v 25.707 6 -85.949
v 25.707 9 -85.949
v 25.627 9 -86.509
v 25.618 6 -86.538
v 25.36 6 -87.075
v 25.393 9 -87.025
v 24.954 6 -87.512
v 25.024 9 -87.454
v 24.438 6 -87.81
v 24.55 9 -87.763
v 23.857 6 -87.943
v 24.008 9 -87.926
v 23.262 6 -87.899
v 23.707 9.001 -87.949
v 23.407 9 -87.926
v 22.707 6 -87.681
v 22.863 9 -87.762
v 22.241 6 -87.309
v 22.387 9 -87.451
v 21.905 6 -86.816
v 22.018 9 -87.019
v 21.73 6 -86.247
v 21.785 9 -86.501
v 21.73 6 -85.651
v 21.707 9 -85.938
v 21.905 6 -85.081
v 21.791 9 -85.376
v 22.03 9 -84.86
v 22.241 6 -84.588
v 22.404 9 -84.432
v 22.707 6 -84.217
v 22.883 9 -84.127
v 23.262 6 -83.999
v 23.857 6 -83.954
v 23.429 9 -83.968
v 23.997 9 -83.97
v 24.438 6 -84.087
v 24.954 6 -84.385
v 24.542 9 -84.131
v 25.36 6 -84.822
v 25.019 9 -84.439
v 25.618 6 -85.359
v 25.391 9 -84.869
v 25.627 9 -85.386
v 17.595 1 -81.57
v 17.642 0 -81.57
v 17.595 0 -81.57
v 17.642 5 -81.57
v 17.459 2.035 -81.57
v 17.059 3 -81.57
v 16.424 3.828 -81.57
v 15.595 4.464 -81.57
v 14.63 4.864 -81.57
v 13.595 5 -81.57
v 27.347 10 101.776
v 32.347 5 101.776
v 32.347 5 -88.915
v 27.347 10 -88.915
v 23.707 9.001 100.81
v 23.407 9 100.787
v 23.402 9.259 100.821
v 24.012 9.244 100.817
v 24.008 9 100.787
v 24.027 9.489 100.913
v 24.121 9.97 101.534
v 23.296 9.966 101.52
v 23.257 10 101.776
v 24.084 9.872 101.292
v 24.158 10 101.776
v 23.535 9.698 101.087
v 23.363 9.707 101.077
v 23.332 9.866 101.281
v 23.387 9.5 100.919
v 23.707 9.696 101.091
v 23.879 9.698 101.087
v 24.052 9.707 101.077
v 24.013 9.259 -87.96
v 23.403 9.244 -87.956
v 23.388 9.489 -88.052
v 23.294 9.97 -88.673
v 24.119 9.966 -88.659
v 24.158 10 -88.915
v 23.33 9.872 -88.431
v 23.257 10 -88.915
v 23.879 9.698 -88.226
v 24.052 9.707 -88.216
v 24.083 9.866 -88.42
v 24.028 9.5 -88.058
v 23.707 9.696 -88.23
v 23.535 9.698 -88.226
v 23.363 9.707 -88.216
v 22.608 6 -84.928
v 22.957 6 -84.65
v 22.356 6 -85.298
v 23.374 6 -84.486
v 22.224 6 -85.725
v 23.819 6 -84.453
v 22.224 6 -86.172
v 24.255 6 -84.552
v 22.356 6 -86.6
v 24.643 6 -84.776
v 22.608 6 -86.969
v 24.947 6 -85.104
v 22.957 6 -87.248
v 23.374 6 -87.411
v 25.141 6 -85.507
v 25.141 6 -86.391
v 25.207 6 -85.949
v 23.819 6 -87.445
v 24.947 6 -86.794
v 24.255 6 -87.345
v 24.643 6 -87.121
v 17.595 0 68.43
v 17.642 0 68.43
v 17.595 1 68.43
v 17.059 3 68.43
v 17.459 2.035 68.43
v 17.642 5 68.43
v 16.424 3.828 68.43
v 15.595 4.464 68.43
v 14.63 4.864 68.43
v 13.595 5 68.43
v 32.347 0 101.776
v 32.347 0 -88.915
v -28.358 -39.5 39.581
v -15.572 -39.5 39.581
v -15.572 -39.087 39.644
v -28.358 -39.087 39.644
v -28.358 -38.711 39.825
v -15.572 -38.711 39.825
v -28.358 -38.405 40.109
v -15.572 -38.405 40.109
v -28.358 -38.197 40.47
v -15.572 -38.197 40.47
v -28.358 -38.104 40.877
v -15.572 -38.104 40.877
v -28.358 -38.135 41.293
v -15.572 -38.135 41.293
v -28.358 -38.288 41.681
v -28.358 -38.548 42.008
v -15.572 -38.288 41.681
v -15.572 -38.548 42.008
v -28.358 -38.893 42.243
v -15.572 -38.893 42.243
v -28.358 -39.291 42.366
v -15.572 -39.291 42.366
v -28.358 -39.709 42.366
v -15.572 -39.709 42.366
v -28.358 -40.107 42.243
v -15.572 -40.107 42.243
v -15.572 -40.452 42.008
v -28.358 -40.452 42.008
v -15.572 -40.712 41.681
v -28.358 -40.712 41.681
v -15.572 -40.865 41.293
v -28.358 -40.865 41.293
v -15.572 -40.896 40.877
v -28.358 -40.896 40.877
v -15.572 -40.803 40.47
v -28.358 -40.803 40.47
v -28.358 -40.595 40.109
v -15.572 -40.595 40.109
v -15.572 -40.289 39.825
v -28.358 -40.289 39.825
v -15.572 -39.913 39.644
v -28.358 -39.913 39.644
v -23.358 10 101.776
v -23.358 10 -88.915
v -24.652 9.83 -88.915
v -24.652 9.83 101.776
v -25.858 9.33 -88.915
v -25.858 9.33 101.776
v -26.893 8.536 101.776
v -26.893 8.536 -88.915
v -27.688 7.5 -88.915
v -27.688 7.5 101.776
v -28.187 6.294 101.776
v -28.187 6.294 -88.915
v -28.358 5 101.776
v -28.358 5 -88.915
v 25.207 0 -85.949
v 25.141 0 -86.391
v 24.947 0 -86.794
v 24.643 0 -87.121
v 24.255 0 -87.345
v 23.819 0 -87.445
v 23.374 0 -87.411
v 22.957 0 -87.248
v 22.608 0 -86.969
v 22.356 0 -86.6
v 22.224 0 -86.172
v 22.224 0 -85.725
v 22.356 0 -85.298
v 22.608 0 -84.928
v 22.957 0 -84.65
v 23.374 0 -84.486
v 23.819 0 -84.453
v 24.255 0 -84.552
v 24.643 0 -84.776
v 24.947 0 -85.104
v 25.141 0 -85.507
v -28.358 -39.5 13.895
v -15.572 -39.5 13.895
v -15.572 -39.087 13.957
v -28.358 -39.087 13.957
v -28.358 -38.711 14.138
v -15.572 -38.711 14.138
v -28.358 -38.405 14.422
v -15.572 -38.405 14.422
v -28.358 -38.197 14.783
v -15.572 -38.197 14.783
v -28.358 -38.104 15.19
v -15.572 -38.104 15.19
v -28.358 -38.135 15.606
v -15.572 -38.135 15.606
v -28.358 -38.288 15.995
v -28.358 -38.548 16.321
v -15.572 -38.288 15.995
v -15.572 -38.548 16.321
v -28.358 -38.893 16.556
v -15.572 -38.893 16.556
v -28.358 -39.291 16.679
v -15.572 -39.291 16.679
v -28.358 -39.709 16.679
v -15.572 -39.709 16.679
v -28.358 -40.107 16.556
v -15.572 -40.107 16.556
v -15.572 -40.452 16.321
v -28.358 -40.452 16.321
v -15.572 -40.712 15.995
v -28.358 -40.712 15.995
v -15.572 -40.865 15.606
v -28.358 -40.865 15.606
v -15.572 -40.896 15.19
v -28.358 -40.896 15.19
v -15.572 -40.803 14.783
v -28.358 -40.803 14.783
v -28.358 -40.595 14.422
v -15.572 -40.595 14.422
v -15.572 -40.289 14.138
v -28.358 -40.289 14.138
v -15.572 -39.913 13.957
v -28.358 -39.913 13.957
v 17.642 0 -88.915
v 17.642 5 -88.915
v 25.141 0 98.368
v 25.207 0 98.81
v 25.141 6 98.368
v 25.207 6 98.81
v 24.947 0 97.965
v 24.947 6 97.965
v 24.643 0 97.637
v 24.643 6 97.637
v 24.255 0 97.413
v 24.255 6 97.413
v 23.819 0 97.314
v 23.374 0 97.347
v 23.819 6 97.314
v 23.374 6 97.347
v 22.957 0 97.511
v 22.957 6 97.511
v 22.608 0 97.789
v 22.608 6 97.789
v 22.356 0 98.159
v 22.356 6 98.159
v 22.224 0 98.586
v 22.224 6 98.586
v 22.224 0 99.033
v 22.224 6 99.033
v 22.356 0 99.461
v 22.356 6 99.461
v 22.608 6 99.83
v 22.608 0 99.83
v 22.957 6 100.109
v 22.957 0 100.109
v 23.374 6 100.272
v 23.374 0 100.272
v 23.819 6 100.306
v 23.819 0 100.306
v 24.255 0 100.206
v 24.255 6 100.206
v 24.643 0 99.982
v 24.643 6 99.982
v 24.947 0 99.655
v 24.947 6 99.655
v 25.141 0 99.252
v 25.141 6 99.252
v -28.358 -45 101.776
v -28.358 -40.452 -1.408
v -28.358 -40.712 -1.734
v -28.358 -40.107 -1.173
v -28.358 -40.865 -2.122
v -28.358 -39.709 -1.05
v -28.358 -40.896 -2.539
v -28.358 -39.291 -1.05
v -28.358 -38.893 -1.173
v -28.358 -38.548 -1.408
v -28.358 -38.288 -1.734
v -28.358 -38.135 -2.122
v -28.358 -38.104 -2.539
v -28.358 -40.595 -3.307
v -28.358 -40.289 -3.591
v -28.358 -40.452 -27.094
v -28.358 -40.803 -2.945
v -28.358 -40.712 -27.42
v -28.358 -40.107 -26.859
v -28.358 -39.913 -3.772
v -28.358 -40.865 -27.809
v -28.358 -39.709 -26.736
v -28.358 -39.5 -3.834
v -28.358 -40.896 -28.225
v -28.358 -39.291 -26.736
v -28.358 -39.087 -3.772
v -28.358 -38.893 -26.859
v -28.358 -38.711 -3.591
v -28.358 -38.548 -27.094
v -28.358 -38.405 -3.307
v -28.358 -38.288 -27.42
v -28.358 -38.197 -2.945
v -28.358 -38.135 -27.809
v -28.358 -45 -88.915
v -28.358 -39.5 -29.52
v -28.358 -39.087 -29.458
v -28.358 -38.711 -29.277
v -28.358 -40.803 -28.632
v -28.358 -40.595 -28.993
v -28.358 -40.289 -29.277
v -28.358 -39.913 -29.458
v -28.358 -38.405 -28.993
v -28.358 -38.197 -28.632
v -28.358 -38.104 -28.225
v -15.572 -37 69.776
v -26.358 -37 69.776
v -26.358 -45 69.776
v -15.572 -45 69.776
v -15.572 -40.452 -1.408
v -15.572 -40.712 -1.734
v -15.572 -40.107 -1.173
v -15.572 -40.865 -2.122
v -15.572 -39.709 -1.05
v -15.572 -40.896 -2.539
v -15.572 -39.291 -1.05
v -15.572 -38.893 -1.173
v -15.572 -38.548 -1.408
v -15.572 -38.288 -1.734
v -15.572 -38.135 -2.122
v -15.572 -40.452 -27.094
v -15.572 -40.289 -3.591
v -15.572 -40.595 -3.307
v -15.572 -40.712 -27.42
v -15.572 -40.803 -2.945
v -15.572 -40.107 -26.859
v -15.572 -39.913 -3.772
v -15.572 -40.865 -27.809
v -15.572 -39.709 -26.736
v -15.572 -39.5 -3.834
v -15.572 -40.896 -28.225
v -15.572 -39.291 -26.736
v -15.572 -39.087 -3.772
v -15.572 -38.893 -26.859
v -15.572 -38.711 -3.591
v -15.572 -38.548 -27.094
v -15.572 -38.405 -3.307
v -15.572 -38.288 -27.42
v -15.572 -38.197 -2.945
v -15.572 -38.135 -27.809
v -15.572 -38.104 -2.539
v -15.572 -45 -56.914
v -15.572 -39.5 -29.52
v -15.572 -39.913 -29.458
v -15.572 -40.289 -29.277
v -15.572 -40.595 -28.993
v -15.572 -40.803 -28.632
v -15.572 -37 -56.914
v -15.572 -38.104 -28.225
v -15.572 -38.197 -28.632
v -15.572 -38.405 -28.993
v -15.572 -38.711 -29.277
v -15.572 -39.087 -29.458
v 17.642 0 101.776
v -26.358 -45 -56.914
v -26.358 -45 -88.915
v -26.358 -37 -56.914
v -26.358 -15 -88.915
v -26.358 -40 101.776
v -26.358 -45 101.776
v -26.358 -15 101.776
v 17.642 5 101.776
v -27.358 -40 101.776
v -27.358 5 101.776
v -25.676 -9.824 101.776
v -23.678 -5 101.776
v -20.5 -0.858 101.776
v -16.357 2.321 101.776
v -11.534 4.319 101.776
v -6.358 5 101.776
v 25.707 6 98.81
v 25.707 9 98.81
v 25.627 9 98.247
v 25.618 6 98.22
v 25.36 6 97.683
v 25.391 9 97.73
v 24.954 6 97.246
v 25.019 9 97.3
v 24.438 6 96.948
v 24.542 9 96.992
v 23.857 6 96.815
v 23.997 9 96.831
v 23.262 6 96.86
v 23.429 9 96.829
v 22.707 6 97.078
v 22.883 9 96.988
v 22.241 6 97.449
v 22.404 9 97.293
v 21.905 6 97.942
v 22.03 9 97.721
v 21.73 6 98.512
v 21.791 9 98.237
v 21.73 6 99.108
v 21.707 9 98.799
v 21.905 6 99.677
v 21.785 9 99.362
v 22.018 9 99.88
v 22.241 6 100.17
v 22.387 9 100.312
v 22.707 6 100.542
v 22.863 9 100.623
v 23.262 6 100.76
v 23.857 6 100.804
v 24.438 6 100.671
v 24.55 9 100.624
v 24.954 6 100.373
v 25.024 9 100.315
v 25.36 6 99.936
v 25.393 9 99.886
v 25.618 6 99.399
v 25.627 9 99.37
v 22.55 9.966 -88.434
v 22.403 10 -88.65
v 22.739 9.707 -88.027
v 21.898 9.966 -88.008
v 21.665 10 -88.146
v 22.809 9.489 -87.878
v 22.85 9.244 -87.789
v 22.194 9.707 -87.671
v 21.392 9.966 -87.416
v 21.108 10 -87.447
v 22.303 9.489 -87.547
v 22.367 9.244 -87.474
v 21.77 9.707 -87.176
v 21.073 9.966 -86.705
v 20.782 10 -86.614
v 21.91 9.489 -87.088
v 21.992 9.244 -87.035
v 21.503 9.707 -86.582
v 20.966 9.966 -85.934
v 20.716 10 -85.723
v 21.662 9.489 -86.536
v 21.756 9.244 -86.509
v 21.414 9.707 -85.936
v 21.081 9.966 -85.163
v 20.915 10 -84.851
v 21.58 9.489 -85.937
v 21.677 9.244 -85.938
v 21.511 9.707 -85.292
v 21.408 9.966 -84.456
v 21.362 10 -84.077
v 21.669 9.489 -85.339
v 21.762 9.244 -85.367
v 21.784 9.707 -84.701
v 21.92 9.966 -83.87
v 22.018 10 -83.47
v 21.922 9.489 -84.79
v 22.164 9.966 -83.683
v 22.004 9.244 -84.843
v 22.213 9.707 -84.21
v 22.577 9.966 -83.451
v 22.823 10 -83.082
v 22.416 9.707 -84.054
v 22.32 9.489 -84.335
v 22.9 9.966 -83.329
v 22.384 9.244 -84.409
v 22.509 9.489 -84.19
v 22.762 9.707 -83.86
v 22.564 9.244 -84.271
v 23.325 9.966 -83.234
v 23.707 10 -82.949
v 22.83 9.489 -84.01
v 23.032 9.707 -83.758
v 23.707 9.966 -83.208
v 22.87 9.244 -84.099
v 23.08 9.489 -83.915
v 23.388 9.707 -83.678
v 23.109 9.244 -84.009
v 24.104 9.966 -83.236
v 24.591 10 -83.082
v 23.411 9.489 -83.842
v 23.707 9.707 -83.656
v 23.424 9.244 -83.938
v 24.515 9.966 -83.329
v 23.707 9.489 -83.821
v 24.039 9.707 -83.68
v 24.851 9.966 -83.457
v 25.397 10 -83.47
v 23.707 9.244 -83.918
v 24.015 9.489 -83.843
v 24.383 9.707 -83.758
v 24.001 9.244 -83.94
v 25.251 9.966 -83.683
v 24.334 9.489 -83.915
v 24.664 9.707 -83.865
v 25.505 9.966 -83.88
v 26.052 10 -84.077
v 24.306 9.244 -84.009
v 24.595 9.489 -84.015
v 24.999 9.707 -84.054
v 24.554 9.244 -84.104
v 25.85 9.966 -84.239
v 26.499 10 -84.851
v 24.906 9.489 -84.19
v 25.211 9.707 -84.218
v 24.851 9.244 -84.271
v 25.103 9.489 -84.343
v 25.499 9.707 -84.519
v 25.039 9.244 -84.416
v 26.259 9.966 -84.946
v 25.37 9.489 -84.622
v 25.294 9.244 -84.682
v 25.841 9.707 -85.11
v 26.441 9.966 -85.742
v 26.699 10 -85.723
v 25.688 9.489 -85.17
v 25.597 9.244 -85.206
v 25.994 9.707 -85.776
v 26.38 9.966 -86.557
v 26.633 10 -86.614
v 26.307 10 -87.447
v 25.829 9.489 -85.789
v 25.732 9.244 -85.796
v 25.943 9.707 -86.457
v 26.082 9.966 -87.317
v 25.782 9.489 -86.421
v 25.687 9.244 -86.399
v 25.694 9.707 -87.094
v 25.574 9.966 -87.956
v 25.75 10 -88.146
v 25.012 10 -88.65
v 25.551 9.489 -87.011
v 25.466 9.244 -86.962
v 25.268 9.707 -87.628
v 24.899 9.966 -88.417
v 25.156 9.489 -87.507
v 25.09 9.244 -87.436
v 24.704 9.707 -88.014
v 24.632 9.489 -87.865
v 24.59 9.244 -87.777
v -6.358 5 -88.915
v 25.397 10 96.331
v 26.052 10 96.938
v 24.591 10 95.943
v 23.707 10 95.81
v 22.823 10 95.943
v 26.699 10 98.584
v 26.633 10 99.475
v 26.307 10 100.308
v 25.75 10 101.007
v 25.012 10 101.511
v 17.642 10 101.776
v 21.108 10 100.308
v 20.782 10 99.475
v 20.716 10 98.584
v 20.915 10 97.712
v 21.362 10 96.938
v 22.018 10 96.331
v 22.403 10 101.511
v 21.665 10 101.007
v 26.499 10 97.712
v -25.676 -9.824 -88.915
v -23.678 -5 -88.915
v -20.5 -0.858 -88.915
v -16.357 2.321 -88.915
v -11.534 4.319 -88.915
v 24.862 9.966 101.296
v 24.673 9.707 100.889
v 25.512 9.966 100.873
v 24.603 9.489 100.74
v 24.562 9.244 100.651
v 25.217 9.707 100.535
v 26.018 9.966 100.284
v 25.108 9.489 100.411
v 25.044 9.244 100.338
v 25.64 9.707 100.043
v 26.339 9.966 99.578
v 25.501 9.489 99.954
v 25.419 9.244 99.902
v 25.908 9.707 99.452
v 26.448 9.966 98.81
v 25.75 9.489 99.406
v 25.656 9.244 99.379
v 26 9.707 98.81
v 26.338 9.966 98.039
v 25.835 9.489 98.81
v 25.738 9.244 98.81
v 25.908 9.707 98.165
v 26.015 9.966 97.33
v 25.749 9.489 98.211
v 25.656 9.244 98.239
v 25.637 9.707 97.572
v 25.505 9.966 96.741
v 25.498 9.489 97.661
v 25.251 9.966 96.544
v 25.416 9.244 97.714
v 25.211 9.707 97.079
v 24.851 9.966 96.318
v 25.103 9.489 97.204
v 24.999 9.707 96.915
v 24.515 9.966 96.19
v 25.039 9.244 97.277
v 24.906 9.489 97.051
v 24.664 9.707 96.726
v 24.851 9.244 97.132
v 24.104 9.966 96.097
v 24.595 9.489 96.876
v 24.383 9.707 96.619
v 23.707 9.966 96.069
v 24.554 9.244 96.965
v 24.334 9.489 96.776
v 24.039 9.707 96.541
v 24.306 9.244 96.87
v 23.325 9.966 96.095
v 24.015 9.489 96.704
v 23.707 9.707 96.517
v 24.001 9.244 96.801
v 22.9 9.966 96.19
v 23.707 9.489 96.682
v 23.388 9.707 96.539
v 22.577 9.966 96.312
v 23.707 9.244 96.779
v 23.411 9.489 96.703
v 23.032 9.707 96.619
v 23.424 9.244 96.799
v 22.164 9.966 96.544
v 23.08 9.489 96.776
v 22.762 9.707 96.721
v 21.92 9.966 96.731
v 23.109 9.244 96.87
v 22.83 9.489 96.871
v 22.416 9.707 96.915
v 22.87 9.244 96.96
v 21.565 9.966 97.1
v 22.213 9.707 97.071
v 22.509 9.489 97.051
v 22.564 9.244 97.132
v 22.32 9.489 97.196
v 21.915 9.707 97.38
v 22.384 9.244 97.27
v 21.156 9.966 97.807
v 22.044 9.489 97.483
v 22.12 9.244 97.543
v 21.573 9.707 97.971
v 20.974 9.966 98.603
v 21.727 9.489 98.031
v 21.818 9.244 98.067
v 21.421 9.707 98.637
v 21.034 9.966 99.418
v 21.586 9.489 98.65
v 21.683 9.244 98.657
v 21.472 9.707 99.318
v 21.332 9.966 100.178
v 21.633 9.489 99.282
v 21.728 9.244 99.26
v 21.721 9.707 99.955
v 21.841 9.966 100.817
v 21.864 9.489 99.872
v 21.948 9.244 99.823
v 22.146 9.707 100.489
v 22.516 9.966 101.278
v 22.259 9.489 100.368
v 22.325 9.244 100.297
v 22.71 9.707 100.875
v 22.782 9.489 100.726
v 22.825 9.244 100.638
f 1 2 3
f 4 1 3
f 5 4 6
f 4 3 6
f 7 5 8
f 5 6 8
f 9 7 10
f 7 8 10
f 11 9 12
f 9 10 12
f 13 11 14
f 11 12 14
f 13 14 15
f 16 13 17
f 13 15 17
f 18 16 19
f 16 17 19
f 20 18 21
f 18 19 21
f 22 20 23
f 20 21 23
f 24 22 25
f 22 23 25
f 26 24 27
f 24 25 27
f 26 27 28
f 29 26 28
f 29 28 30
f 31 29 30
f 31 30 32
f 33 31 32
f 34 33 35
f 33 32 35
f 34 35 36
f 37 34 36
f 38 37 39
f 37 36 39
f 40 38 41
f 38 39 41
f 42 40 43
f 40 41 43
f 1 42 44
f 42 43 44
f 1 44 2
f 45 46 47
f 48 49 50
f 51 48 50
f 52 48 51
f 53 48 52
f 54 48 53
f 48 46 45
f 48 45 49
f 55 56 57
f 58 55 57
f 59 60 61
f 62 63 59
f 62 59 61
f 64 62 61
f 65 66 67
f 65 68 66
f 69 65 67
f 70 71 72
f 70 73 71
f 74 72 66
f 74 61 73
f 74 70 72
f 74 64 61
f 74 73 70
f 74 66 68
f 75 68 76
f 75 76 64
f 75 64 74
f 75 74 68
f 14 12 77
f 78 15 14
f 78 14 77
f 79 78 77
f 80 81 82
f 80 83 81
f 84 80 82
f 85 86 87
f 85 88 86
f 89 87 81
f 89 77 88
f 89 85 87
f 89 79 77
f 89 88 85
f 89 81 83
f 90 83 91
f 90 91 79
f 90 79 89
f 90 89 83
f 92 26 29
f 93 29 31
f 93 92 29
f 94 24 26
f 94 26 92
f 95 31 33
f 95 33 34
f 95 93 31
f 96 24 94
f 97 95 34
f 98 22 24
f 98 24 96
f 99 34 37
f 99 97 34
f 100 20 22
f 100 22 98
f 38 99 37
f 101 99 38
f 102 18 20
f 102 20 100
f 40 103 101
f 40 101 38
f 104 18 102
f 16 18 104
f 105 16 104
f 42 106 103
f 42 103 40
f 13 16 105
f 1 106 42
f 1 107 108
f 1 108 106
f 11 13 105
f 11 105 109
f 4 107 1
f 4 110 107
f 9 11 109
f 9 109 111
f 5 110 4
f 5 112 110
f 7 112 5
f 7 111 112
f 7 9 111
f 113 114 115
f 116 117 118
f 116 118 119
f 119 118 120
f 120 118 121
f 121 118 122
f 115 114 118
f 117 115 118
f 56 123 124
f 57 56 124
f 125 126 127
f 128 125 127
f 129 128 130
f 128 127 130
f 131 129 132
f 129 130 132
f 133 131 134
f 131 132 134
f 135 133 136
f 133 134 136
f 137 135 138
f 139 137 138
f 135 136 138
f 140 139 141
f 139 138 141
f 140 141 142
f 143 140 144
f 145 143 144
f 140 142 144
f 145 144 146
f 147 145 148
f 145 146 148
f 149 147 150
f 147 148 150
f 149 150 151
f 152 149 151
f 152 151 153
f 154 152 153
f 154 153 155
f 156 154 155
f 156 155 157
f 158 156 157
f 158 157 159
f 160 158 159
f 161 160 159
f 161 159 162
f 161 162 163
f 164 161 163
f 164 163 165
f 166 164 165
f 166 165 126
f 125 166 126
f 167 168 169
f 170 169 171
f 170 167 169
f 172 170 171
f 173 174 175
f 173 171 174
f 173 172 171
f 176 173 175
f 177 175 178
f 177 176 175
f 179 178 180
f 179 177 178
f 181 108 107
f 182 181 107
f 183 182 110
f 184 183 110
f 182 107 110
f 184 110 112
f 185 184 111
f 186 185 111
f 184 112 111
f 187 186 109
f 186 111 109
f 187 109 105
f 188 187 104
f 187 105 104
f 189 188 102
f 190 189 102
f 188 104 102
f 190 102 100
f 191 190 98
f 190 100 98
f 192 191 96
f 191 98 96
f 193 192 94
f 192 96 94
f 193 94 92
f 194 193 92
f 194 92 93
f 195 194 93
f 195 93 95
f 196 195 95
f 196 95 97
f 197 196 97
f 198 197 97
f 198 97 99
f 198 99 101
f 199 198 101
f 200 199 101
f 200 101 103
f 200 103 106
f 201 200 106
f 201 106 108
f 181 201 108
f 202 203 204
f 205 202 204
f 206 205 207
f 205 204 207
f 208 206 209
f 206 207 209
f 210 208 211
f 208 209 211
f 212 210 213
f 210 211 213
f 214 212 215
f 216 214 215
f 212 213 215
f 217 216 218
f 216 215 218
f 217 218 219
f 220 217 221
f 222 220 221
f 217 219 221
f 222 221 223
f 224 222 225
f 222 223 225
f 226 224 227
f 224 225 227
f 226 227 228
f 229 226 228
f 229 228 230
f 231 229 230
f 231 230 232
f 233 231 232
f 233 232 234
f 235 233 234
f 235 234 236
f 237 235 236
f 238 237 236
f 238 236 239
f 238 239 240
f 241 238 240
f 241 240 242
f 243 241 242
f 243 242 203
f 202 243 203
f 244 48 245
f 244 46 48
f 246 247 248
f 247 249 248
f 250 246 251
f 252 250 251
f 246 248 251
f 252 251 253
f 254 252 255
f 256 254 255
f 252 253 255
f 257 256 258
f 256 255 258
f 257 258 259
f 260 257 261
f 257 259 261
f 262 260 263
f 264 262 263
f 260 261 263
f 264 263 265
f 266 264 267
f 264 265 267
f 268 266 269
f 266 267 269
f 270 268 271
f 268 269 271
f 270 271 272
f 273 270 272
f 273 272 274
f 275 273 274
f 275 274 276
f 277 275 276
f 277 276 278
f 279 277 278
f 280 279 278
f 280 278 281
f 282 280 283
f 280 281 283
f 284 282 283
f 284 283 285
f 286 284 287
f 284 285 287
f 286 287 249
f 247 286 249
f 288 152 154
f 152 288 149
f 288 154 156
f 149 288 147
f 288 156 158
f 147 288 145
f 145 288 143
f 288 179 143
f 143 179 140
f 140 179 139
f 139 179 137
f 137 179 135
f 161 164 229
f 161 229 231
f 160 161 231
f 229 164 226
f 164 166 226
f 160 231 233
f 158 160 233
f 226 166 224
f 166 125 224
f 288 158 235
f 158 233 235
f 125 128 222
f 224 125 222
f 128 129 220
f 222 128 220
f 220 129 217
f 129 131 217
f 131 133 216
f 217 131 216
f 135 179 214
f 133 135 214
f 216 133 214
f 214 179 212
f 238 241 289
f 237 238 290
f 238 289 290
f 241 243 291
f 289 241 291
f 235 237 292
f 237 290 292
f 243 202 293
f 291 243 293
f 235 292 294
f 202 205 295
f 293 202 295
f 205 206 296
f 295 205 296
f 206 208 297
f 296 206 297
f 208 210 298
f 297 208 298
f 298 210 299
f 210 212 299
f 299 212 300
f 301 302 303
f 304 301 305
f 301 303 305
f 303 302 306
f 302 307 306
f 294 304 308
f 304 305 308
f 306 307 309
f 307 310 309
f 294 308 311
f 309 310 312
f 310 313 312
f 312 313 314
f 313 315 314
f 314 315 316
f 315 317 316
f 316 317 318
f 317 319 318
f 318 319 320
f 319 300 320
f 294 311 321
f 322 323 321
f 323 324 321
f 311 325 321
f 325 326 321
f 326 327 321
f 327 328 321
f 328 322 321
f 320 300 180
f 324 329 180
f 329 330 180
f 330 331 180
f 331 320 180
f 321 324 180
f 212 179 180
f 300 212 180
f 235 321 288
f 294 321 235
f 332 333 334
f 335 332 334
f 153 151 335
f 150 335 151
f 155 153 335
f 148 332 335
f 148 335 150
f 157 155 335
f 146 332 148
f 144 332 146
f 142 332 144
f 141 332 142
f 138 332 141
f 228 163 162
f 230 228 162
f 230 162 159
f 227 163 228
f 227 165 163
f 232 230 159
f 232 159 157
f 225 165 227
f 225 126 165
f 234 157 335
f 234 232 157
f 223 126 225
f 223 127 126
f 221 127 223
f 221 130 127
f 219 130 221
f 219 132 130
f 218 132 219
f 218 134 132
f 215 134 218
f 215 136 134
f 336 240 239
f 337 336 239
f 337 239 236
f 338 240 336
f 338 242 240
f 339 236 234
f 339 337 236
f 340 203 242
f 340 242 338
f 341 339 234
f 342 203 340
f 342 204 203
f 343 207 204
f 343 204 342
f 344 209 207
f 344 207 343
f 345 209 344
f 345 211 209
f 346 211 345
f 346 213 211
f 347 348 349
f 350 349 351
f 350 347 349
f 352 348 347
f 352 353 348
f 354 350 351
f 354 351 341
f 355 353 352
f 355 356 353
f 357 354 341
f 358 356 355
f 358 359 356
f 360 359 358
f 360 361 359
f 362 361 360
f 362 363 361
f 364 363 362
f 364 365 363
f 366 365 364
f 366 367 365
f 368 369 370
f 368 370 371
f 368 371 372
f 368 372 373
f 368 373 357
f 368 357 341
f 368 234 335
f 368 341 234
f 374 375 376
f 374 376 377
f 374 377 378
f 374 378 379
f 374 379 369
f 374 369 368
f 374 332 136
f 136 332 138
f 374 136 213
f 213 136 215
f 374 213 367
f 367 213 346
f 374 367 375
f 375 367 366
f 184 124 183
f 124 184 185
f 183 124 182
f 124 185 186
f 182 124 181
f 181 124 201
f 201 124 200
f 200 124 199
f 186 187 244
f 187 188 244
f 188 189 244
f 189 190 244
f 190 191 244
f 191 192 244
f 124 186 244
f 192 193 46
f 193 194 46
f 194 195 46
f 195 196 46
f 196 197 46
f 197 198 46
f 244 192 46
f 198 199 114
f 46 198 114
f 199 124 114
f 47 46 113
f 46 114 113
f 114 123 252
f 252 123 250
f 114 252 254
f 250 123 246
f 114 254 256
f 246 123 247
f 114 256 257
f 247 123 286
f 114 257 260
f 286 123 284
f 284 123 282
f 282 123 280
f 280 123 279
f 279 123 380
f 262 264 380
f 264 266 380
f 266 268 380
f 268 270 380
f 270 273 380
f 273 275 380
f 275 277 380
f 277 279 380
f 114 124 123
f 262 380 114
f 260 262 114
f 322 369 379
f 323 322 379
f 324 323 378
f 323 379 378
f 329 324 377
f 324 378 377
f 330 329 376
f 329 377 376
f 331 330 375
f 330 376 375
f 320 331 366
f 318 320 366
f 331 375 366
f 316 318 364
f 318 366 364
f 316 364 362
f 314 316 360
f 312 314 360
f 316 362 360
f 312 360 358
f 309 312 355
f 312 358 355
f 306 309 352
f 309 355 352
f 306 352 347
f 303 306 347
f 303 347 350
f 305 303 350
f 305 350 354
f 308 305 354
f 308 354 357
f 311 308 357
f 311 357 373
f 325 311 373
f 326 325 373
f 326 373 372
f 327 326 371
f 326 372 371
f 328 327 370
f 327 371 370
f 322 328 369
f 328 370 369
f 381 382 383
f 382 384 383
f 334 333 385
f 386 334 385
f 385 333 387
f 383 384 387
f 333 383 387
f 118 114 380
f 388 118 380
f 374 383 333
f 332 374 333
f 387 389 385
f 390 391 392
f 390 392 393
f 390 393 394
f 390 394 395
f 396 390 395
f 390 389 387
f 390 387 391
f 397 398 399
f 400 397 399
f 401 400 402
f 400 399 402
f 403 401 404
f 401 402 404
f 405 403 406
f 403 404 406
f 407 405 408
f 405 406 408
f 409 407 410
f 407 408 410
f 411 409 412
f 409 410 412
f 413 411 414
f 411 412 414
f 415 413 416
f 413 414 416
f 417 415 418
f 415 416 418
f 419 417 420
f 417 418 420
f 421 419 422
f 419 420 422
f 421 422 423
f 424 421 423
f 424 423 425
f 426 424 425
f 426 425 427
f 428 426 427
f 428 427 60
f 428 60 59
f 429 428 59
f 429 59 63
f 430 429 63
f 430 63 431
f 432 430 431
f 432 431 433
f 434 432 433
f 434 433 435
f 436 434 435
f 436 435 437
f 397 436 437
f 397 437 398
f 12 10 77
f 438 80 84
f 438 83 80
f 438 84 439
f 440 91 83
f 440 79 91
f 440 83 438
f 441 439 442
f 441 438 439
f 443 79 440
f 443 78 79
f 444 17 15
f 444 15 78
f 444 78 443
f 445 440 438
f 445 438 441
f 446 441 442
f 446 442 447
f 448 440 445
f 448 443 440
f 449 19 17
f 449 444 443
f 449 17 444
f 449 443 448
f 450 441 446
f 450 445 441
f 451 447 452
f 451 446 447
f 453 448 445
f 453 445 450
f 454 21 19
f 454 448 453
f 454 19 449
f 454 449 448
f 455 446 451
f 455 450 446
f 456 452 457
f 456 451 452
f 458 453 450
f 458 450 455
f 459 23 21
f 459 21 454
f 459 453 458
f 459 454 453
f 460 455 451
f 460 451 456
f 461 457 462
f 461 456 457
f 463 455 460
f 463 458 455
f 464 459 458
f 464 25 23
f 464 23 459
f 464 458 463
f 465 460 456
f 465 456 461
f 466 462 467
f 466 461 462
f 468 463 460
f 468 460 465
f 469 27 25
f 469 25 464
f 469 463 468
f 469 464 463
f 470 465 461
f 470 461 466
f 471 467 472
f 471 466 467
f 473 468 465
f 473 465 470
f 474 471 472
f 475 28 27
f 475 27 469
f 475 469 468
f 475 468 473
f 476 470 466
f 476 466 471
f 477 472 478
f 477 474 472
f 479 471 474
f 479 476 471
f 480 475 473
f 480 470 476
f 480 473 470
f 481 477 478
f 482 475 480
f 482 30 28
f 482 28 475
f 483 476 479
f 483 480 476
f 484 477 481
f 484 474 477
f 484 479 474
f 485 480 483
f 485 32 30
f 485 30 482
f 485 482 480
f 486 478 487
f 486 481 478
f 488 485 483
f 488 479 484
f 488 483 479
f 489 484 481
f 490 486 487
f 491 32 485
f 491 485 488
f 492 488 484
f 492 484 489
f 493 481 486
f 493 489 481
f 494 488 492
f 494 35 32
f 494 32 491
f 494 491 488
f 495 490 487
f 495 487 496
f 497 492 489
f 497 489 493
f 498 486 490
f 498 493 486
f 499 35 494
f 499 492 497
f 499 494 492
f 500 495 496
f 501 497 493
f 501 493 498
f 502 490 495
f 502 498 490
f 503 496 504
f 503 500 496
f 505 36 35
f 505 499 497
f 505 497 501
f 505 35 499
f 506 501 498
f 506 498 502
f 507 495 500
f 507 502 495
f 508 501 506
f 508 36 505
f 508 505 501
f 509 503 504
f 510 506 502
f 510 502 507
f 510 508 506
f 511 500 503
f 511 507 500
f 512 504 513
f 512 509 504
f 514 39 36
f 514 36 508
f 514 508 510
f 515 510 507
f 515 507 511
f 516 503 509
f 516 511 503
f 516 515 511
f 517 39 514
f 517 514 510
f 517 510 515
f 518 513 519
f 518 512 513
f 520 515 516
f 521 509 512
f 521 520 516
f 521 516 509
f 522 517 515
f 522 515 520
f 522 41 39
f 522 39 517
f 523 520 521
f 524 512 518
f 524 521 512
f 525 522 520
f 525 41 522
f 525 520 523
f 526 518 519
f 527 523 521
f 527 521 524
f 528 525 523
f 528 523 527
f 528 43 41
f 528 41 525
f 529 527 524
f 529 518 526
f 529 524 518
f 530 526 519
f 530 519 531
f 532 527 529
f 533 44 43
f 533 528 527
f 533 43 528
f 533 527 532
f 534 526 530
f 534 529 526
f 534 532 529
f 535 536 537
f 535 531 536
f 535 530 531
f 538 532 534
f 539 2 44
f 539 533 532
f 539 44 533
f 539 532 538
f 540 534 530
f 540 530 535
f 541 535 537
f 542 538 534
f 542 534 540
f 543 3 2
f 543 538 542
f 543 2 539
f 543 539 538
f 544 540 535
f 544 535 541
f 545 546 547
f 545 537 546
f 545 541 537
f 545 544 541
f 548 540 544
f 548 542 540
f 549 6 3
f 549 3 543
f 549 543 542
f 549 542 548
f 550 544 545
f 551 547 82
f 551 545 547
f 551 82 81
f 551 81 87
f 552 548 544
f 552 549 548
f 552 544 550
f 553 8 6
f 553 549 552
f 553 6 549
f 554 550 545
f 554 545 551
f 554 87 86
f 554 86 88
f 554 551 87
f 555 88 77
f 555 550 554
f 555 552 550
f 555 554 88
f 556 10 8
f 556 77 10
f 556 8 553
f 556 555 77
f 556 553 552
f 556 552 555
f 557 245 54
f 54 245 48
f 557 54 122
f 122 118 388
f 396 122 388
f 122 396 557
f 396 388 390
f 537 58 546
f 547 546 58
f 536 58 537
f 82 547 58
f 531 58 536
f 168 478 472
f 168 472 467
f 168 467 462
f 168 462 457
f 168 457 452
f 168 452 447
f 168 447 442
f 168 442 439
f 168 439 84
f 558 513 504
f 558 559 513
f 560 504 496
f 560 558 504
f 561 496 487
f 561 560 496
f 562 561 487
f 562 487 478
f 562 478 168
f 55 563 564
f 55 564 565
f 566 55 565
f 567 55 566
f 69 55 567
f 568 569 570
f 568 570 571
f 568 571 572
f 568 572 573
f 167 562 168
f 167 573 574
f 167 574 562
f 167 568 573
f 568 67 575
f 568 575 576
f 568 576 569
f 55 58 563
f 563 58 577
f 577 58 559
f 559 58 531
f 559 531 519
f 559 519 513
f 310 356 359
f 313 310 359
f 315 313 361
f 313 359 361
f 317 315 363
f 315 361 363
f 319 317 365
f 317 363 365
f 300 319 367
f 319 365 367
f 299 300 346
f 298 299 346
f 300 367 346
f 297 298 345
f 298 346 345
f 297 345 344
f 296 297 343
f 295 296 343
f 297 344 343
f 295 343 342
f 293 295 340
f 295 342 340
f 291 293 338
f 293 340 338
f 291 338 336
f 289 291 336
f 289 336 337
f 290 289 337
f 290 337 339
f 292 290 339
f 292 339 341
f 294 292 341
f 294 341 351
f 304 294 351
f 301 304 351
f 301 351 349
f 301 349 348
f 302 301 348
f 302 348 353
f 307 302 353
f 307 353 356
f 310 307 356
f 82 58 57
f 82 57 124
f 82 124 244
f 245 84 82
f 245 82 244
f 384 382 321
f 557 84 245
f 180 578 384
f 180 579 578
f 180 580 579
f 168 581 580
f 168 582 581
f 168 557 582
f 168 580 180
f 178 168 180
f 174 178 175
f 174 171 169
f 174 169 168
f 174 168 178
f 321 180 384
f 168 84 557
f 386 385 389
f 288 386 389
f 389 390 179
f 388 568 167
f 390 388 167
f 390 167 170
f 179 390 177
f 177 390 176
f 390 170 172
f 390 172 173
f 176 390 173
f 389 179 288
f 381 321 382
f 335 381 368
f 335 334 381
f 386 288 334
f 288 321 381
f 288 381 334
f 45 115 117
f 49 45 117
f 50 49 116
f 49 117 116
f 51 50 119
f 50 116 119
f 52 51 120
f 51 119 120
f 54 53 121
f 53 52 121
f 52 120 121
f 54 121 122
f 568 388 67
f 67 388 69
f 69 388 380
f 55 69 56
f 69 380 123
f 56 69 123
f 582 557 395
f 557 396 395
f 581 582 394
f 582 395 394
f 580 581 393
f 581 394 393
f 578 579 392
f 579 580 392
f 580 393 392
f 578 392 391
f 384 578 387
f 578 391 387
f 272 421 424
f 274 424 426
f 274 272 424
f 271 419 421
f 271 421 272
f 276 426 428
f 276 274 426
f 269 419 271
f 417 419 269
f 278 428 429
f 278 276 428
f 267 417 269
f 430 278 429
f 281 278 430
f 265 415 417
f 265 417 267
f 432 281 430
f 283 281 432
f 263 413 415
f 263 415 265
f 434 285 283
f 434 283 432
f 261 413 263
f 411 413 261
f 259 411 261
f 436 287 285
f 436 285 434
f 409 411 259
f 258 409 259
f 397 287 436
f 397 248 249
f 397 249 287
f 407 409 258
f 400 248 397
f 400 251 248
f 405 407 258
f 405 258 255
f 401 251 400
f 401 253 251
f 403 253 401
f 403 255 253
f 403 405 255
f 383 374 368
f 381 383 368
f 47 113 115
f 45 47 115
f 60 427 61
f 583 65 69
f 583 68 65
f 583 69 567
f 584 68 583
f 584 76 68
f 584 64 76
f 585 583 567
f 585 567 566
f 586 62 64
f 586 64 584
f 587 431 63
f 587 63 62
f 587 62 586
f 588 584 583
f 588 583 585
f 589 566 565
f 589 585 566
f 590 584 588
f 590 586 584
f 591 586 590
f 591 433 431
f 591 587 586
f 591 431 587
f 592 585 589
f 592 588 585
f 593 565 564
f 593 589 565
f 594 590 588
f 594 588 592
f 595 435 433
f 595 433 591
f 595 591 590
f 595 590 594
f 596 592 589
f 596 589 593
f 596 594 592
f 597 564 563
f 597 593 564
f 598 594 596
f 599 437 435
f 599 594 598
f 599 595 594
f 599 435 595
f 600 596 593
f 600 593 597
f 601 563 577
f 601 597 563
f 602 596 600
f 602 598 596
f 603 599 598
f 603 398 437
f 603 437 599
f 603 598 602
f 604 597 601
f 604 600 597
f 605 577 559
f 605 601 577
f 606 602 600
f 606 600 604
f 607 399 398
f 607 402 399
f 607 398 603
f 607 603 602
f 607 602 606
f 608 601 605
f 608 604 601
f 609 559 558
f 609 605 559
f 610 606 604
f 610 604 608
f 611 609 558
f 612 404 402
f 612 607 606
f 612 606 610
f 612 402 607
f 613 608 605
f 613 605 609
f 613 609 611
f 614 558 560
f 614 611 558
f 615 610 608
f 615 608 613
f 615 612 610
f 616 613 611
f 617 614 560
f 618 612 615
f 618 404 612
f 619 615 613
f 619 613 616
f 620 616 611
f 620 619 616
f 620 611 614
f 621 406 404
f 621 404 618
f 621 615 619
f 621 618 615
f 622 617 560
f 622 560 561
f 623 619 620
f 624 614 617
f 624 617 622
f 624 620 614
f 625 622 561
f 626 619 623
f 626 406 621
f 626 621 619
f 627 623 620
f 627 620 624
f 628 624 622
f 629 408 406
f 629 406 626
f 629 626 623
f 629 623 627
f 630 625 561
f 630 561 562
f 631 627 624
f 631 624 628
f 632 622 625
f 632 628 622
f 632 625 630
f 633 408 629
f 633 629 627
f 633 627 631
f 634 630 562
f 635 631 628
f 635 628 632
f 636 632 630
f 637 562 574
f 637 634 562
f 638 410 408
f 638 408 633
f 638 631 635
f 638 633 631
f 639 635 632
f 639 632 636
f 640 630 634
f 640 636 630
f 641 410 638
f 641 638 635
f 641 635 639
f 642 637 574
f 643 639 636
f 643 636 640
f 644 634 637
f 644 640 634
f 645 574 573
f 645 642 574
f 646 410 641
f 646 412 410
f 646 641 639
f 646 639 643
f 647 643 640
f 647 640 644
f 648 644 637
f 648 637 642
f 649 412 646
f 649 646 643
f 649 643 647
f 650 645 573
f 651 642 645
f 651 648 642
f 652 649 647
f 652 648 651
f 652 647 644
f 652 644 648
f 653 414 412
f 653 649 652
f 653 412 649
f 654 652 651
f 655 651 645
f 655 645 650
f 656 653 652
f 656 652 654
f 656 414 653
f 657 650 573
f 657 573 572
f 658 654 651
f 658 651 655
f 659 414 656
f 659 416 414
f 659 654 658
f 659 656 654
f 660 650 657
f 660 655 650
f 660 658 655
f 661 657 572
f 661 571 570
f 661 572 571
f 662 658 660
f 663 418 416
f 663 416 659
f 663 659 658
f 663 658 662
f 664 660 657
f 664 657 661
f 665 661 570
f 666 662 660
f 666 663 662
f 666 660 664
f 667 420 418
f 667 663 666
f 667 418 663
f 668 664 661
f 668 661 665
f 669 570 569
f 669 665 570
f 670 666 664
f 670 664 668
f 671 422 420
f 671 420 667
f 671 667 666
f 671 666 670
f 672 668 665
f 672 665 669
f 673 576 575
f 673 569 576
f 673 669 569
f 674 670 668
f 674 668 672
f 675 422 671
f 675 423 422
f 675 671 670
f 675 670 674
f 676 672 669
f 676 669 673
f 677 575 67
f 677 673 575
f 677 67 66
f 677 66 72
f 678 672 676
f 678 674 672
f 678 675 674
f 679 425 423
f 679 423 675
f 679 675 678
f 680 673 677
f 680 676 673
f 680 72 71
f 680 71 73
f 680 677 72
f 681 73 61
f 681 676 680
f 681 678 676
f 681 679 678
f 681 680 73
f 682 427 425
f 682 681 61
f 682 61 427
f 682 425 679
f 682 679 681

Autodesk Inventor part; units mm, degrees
ref_plane "YZ Plane" through (0, 0, 0) normal (1, 0, 0) x (0, 1, 0)
ref_plane "XZ Plane" through (0, 0, 0) normal (0, 1, 0) x (-1, 0, 0)
ref_plane "XY Plane" through (0, 0, 0) normal (0, 0, 1) x (1, 0, 0)
sketch "Sketch1" plane through (0, 0, 0) normal (0, 1, 0) x (-1, 0, 0)
  line L0 (-32.3469, 68.4305) -> (-32.3469, -55.5695)
  line L1 (-17.6425, -88.9147) -> (-32.3469, -88.9147)
  line L2 (-32.3469, -88.9147) -> (-32.3469, -55.5695)
  line L3 (-32.3469, -55.5695) -> (-17.6425, -55.5695)
  line L4 (-17.6425, -55.5695) -> (-17.6425, -88.9147)
  line L5 (-27.3469, -55.5695) -> (-27.3469, 68.4305)
  line L6 (-32.3469, -55.5695) -> (-27.3469, -55.5695)
  line L7 (-27.3469, -55.5695) -> (-27.3469, 68.4305)
  line L8 (-27.3469, 68.4305) -> (-32.3469, 68.4305)
  line L9 (-32.3469, 68.4305) -> (-32.3469, -55.5695)
  line L10 (-32.3469, 68.4305) -> (-17.6425, 68.4305)
  line L11 (-17.6425, 68.4305) -> (-17.6425, 101.7757)
  line L12 (-17.6425, 101.7757) -> (-32.3469, 101.7757)
  line L13 (-32.3469, 101.7757) -> (-32.3469, 68.4305)
  point P0 (0, 0)
  point P1 (25.2053, -93.5695)
extrude "Extrusion1" add sketch "Sketch1" along normal blind 10
chamfer "Chamfer1" distance 5 angle 45 1 edges at (32.3469, 10, 6.4305)
sketch "Sketch2" plane through (17.6425, 0, -88.9147) normal (-1, 0, 0) x (0, 0, 1)
  line L0 (0, 0) -> (0, 10) projected
  line L1 (33.3452, 0) -> (33.3452, 10) projected
  line L2 (0, 10) -> (33.3452, 10)
  line L3 (33.3452, 10) -> (33.3452, 5)
  line L4 (33.3452, 5) -> (0, 5)
  line L5 (0, 5) -> (0, 10)
  line L6 (157.3452, 10) -> (190.6905, 10) projected
  line L7 (157.3452, 0) -> (157.3452, 10) projected
  line L8 (190.6905, 10) -> (157.3452, 10)
  line L9 (157.3452, 10) -> (157.3452, 5)
  line L10 (157.3452, 5) -> (190.6905, 5)
  line L11 (190.6905, 5) -> (190.6905, 10)
  point P0 (88.9147, 0)
  dimension "d5" = 5
extrude "Extrusion2" add sketch "Sketch2" along normal blind 46
sketch "Sketch3" plane through (17.6425, 5, -88.9147) normal (0, -1, 0) x (1, 0, 0)
  line L0 (9.7044, 0) -> (-46, 0) projected
  line L1 (9.7044, 33.3452) -> (-46, 33.3452) projected
  line L2 (-46, 0) -> (-44, 0)
  line L3 (-44, 0) -> (-44, 33.3452)
  line L4 (-44, 33.3452) -> (-46, 33.3452)
  line L5 (-46, 33.3452) -> (-46, 0)
  line L6 (9.7044, 190.6905) -> (-46, 190.6905) projected
  line L7 (9.7044, 157.3452) -> (-46, 157.3452) projected
  line L8 (-46, 190.6905) -> (-45, 190.6905)
  line L9 (-45, 190.6905) -> (-45, 157.3452)
  line L10 (-45, 157.3452) -> (-46, 157.3452)
  line L11 (-46, 157.3452) -> (-46, 190.6905)
  point P0 (-17.6425, 88.9147)
  dimension "d8" = 2
extrude "Extrusion3" add sketch "Sketch3" along normal blind 45
sketch "Sketch4" plane through (27.3469, 0, 68.4305) normal (0, 0, -1) x (-1, 0, 0)
  line L0 (0, 10) -> (55.7044, 10) projected
  line L1 (0, 0) -> (9.7517, 0)
  line L2 (9.7517, 0) -> (9.7517, 10)
  line L3 (9.7517, 10) -> (0, 10)
  line L4 (0, 10) -> (0, 0)
  line L5 (9.7517, 5) -> (55.7044, 5)
  line L6 (55.7044, 5) -> (55.7044, 10)
  line L7 (55.7044, 10) -> (9.7517, 10)
  line L8 (9.7517, 10) -> (9.7517, 5)
  line L9 (54.7044, 5) -> (54.7044, -40) projected
  line L10 (55.7044, 5) -> (54.7044, 5)
  line L11 (54.7044, 5) -> (54.7044, -40)
  line L12 (54.7044, -40) -> (55.7044, -40)
  line L13 (55.7044, -40) -> (55.7044, 5)
  point P0 (27.3469, 0)
extrude "Extrusion4" add sketch "Sketch4" along normal blind 150
sketch "Sketch5" plane through (-27.3575, 5, 101.7757) normal (1, 0, 0) x (0, 0, -1)
  line L0 (0, 0) -> (157.3452, 0) projected
  line L1 (190.6905, -45) -> (157.3452, -45) projected
  line L2 (0, 0) -> (157.3452, 0)
  line L3 (157.3452, 0) -> (157.3452, -45)
  line L4 (157.3452, -45) -> (0, -45)
  line L5 (0, -45) -> (0, 0)
  point P0 (101.7757, -5)
extrude "Extrusion5" add sketch "Sketch5" along normal blind 1
sketch "Sketch8" plane through (17.6425, -40, -88.9147) normal (0, -1, 0) x (1, 0, 0)
  line L0 (-44, 0) -> (-44, 190.6905) projected
  line L1 (9.7044, 0) -> (-46, 0) projected
  line L2 (-44, 190.6905) -> (-46, 190.6905)
  line L3 (-46, 190.6905) -> (-46, 0)
  line L4 (-46, 0) -> (-44, 0)
  line L5 (-44, 0) -> (-44, 190.6905)
  point P0 (-17.6425, 88.9147)
extrude "Extrusion8" add sketch "Sketch8" along normal blind 5
sketch "Sketch9" plane through (-26.3575, 5, 101.7757) normal (1, 0, 0) x (0, 0, -1)
  line L0 (0, 0) -> (0, -50) projected
  line L1 (0, -50) -> (32, -50)
  line L2 (0, -50) -> (190.6905, -50) projected
  line L3 (190.6905, -50) -> (158.6905, -50)
  line L4 (32, -50) -> (155.0848, -50)
  line L5 (155.0848, -50) -> (155.0848, -42)
  line L6 (155.0848, -42) -> (32, -42)
  line L7 (32, -42) -> (32, -50)
  point P0 (101.7757, -5)
  dimension "d29" = 32
  dimension "d30" = 32
  dimension "d31" = 8
extrude "Extrusion9" add sketch "Sketch9" along normal blind 10.786
sketch "Sketch10" plane through (-15.5715, 5, 101.7757) normal (1, 0, 0) x (0, 0, -1)
  line L0 (190.6905, 5) -> (0, 5) projected
  line L1 (95.3452, 5) -> (95.3452, -50)
  line L2 (0, -50) -> (190.6905, -50) projected
  circle A0 centre (49.4524, -47.1745) radius 1.5
  circle A1 centre (49.4524, -47.1745) radius 1.5
  circle A2 centre (79.4524, -47.1745) radius 1.5
  circle A3 centre (79.4524, -47.1745) radius 1.5
  circle A4 centre (109.4524, -47.1745) radius 1.5
  circle A5 centre (109.4524, -47.1745) radius 1.5
  circle A6 centre (139.4524, -47.1745) radius 1.5
  circle A7 centre (139.4524, -47.1745) radius 1.5
  line L3 (157.7974, -50) -> (157.7974, -40)
  line L4 (31.1074, -40) -> (31.1074, -50)
  line L5 (31.1074, -40) -> (157.7974, -40)
  line L6 (157.7974, -40) -> (157.7974, -50)
  line L7 (157.7974, -50) -> (31.1074, -50)
  line L8 (31.1074, -50) -> (31.1074, -40)
  line L9 (95.3452, -50) -> (95.3452, -40)
  line L10 (155.0848, -42) -> (32, -42) projected
  line L11 (95.3452, -42) -> (32, -42)
  line L12 (95.3452, -42) -> (158.6902, -42)
  line L13 (158.6902, -42) -> (158.6902, -50)
  line L14 (158.6902, -50) -> (155.0848, -50)
  line L15 (155.0848, -50) -> (155.0848, -42) projected
  line L16 (155.0848, -50) -> (155.0848, -42)
  line L17 (155.0848, -42) -> (158.6902, -42)
  point P0 (101.7757, -5)
  point P1 (155.0848, -50)
  dimension "d34" = 63.345
extrude "Extrusion10" add sketch "Sketch10" against normal blind 10.786 contours L12 L3 L2 L15 | L12 L13 L2 L3
fillet "Fillet1" radius 5 1 edges at (-28.3575, 10, 6.4305)
fillet "Fillet2" radius 20 1 edges at (-26.3575, 5, 6.4305)
fillet "Fillet4" radius 4 1 edges at (17.5953, 5, -6.5695)
sketch "Sketch11" plane through (0, 10, 0) normal (0, 1, 0) x (1, 0, 0)
  circle A0 centre (23.7073, 85.9487) radius 2
  circle A1 centre (23.7073, 85.9487) radius 1.5
  line L0 (32.3469, -101.7757) -> (32.3469, 88.9147) projected
  line L1 (32.3469, -6.4305) -> (-25.9991, -6.4305)
  circle A2 centre (23.7073, -98.8097) radius 2
  circle A3 centre (23.7073, -98.8097) radius 1.5
  point P0 (0, 0)
  dimension "d43" = 4
  dimension "d44" = 3
extrude "Extrusion12" cut sketch "Sketch11" against normal blind 4 contours A0 | A1 | A2 | A3
extrude "Extrusion13" cut sketch "Sketch11" against normal blind 100 contours A1 | A3
fillet "Fillet5" radius 1 1 edges at (21.7073, 10, -85.9487)
fillet "Fillet6" radius 1 1 edges at (21.7073, 10, 98.8097)
sketch "Sketch12" plane through (-15.5715, 5, 101.7757) normal (1, 0, 0) x (0, 0, -1)
  line L0 (33.3452, -5) -> (157.3452, -5)
  line L1 (95.3452, -5) -> (95.3452, -50)
  line L2 (94.0723, -38) -> (94.0723, -50)
  line L3 (33.5543, -44.5) -> (157.1905, -44.5)
  circle A0 centre (104.2097, -44.5) radius 1.4
  circle A1 centre (129.8962, -44.5) radius 1.4
  circle A2 centre (86.4808, -44.5) radius 1.4
  circle A3 centre (60.7943, -44.5) radius 1.4
  line L4 (32.0002, -40) -> (158.6902, -40)
  line L5 (158.6902, -50) -> (158.6902, -40)
  line L6 (32.0002, -40) -> (158.6902, -40)
  line L7 (158.6902, -40) -> (158.6902, -50)
  line L8 (158.6902, -50) -> (32.0002, -50)
  line L9 (32.0002, -50) -> (32.0002, -40)
  point P0 (101.7757, -5)
  point P1 (13.9577, -136.3434)
  dimension "d52" = 2.8
  dimension "d53" = 2.8
extrude "Extrusion14" cut sketch "Sketch12" against normal blind 100 contours A1 L3 | L3 A1 | A0 L3 | L3 A0 | A3 L3 | L3 A3 | A2 L3 | L3 A2
properties part number "bumper belakang"
